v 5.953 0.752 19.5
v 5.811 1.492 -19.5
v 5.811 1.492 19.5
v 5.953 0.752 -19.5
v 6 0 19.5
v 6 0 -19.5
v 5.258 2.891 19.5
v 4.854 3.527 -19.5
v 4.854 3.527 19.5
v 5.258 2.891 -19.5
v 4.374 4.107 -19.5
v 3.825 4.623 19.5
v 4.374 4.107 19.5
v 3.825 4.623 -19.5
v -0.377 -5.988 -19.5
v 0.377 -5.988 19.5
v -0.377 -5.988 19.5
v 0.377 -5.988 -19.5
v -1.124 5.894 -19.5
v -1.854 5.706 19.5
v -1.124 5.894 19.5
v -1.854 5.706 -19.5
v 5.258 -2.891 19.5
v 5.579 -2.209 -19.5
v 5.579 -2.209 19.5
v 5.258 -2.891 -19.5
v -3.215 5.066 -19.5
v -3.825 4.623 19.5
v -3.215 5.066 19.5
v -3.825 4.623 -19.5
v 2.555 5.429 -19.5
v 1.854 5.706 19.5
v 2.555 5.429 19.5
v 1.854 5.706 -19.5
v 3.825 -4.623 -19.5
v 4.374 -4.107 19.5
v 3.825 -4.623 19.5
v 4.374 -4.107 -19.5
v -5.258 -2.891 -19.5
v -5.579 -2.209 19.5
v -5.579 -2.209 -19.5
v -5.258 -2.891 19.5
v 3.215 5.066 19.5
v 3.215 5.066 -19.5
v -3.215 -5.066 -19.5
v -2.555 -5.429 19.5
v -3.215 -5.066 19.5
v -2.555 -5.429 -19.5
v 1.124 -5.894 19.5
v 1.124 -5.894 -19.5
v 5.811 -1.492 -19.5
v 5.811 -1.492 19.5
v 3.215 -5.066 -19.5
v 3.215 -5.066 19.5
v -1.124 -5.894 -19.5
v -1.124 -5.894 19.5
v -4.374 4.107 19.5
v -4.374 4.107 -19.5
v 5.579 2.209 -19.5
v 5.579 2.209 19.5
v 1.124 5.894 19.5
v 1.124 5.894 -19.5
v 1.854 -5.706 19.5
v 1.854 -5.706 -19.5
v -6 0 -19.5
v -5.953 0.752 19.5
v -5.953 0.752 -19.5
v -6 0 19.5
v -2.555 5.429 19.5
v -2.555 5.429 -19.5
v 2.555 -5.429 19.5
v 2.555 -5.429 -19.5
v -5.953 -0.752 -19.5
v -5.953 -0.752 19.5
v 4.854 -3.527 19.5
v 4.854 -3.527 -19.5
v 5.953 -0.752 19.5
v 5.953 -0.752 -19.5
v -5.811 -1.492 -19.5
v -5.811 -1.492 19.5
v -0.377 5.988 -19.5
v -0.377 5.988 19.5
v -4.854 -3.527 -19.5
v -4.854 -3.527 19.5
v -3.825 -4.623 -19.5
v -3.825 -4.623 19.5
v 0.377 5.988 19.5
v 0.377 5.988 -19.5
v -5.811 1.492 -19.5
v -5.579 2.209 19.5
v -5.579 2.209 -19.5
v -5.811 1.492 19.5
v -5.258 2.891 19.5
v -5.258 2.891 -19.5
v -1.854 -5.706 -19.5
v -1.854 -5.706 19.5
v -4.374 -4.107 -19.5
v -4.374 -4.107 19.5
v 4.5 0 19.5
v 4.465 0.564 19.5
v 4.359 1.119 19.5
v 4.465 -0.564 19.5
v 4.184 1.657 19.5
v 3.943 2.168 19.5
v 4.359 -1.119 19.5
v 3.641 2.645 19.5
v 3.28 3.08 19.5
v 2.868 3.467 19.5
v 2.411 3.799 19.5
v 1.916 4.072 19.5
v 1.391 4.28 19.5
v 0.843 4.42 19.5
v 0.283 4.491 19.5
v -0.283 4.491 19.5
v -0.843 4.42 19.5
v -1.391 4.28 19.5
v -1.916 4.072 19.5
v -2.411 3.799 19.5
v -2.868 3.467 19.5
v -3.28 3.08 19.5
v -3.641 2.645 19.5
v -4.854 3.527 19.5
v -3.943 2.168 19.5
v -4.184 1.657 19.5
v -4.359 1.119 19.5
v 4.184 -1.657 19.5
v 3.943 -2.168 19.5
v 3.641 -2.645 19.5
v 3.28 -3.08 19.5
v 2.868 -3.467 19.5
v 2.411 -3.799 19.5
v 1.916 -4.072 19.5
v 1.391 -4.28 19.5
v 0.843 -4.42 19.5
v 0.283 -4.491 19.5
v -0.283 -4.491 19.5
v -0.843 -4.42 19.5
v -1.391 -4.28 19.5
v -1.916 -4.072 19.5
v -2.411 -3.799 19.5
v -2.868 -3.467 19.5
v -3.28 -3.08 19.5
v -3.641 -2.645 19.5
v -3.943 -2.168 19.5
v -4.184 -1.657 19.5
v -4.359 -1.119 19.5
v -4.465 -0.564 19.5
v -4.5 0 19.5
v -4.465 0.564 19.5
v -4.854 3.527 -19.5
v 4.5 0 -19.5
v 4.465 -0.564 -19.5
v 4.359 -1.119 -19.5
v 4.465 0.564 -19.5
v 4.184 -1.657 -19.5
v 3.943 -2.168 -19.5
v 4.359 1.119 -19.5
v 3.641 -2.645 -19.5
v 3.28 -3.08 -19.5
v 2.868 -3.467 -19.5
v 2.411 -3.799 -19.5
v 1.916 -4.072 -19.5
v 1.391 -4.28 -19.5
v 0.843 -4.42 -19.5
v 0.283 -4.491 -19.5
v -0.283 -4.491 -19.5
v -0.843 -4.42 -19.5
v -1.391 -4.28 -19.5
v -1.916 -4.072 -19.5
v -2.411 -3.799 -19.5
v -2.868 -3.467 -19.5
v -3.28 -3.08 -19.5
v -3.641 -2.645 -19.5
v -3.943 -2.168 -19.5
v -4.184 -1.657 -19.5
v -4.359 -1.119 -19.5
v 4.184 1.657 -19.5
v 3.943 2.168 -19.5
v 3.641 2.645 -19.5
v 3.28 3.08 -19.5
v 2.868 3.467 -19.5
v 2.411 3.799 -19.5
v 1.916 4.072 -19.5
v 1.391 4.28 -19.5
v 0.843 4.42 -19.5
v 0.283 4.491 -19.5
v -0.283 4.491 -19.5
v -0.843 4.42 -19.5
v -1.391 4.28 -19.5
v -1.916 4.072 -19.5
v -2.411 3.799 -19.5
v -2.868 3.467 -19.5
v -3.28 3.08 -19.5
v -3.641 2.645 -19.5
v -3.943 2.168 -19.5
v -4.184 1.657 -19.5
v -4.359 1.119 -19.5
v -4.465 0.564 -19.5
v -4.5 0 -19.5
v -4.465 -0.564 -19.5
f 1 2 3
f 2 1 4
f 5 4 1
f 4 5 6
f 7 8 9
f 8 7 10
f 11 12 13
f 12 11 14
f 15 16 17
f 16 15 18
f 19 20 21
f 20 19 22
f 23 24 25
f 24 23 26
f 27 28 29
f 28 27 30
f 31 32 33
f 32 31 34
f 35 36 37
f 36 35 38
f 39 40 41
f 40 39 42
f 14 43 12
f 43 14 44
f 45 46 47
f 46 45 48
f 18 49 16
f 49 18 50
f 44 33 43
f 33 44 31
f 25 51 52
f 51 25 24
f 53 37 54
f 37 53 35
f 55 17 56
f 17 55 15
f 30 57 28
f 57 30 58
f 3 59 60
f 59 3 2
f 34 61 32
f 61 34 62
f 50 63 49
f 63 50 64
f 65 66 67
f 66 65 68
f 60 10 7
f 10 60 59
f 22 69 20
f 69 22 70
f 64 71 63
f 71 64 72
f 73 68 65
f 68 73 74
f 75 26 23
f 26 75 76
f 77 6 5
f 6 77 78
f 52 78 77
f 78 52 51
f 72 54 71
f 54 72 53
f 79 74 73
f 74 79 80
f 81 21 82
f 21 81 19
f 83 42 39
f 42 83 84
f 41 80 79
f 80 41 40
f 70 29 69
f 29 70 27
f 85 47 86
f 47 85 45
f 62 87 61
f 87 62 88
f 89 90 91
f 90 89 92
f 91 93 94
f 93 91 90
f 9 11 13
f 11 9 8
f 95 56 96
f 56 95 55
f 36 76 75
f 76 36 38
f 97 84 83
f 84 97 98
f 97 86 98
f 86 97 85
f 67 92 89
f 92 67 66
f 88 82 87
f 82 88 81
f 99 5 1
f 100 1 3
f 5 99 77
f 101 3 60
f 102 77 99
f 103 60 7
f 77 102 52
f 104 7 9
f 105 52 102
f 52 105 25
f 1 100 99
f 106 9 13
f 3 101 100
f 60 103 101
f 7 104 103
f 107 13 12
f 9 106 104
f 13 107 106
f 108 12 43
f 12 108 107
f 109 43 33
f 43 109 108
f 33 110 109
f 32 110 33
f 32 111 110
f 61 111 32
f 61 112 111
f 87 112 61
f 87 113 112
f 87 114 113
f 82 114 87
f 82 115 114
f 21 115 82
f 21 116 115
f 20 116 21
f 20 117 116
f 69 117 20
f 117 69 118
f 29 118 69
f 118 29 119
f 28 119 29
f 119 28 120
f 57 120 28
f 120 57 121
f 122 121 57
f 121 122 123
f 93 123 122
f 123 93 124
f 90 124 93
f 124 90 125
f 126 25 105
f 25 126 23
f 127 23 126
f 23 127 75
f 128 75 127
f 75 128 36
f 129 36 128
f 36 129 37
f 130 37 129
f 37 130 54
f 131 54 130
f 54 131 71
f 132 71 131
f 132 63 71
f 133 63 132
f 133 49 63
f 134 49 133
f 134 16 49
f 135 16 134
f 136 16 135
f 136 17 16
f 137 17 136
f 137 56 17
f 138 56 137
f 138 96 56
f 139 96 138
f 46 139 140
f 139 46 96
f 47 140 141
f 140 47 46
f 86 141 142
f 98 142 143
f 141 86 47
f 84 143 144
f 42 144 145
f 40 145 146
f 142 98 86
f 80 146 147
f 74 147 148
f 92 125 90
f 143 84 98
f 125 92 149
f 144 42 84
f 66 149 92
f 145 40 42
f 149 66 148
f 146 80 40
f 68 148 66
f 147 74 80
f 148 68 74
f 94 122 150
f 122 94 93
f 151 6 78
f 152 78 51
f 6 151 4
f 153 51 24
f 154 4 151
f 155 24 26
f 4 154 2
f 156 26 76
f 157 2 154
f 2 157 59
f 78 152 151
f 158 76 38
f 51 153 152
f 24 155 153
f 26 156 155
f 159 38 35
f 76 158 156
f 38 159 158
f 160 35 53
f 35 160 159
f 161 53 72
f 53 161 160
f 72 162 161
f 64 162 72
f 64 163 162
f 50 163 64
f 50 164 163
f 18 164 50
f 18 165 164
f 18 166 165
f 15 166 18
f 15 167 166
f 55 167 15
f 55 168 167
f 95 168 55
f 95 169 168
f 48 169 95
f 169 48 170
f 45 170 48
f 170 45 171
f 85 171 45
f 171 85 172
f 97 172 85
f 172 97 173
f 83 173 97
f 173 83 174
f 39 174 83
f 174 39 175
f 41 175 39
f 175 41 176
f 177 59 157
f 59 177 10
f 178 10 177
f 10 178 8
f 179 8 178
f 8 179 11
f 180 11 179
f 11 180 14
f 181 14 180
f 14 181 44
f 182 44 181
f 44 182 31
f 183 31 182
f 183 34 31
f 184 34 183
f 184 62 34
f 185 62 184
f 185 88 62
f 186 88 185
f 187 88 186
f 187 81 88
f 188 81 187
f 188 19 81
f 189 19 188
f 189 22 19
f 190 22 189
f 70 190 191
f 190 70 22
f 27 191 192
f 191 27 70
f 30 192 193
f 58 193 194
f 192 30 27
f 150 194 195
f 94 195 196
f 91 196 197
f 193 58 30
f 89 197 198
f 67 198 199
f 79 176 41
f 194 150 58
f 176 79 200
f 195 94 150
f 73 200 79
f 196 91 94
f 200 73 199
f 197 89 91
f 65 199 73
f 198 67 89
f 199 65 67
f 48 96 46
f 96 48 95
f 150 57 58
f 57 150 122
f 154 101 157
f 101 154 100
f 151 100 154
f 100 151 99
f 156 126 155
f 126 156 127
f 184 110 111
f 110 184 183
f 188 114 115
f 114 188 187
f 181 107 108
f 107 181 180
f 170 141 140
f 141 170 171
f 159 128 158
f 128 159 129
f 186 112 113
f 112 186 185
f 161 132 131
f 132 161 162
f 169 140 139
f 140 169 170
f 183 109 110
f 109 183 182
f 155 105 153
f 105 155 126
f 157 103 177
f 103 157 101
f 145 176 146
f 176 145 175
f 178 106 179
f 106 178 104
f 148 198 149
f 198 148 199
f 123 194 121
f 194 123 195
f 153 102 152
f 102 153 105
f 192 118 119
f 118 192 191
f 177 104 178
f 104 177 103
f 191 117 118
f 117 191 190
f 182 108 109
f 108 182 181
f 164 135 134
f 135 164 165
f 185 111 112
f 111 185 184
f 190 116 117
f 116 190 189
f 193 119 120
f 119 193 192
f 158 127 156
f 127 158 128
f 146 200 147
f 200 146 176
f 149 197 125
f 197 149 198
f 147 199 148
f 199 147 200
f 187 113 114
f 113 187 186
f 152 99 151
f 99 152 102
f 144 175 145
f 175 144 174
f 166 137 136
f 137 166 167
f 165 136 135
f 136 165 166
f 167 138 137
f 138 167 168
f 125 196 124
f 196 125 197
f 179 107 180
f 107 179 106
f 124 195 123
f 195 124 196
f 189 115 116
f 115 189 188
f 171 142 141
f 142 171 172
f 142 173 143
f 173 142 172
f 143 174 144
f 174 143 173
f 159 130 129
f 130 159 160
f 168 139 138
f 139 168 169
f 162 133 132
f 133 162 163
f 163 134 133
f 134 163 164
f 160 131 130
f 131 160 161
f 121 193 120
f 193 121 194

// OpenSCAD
$fn = 50;


difference() {
	union() {
		translate(v = [0, 0, -19.5000000000]) {
			cylinder(h = 39, r = 6.0000000000);
		}
	}
	union() {
		translate(v = [0, 0, -100.0000000000]) {
			cylinder(h = 200, r = 4.5000000000);
		}
	}
}
